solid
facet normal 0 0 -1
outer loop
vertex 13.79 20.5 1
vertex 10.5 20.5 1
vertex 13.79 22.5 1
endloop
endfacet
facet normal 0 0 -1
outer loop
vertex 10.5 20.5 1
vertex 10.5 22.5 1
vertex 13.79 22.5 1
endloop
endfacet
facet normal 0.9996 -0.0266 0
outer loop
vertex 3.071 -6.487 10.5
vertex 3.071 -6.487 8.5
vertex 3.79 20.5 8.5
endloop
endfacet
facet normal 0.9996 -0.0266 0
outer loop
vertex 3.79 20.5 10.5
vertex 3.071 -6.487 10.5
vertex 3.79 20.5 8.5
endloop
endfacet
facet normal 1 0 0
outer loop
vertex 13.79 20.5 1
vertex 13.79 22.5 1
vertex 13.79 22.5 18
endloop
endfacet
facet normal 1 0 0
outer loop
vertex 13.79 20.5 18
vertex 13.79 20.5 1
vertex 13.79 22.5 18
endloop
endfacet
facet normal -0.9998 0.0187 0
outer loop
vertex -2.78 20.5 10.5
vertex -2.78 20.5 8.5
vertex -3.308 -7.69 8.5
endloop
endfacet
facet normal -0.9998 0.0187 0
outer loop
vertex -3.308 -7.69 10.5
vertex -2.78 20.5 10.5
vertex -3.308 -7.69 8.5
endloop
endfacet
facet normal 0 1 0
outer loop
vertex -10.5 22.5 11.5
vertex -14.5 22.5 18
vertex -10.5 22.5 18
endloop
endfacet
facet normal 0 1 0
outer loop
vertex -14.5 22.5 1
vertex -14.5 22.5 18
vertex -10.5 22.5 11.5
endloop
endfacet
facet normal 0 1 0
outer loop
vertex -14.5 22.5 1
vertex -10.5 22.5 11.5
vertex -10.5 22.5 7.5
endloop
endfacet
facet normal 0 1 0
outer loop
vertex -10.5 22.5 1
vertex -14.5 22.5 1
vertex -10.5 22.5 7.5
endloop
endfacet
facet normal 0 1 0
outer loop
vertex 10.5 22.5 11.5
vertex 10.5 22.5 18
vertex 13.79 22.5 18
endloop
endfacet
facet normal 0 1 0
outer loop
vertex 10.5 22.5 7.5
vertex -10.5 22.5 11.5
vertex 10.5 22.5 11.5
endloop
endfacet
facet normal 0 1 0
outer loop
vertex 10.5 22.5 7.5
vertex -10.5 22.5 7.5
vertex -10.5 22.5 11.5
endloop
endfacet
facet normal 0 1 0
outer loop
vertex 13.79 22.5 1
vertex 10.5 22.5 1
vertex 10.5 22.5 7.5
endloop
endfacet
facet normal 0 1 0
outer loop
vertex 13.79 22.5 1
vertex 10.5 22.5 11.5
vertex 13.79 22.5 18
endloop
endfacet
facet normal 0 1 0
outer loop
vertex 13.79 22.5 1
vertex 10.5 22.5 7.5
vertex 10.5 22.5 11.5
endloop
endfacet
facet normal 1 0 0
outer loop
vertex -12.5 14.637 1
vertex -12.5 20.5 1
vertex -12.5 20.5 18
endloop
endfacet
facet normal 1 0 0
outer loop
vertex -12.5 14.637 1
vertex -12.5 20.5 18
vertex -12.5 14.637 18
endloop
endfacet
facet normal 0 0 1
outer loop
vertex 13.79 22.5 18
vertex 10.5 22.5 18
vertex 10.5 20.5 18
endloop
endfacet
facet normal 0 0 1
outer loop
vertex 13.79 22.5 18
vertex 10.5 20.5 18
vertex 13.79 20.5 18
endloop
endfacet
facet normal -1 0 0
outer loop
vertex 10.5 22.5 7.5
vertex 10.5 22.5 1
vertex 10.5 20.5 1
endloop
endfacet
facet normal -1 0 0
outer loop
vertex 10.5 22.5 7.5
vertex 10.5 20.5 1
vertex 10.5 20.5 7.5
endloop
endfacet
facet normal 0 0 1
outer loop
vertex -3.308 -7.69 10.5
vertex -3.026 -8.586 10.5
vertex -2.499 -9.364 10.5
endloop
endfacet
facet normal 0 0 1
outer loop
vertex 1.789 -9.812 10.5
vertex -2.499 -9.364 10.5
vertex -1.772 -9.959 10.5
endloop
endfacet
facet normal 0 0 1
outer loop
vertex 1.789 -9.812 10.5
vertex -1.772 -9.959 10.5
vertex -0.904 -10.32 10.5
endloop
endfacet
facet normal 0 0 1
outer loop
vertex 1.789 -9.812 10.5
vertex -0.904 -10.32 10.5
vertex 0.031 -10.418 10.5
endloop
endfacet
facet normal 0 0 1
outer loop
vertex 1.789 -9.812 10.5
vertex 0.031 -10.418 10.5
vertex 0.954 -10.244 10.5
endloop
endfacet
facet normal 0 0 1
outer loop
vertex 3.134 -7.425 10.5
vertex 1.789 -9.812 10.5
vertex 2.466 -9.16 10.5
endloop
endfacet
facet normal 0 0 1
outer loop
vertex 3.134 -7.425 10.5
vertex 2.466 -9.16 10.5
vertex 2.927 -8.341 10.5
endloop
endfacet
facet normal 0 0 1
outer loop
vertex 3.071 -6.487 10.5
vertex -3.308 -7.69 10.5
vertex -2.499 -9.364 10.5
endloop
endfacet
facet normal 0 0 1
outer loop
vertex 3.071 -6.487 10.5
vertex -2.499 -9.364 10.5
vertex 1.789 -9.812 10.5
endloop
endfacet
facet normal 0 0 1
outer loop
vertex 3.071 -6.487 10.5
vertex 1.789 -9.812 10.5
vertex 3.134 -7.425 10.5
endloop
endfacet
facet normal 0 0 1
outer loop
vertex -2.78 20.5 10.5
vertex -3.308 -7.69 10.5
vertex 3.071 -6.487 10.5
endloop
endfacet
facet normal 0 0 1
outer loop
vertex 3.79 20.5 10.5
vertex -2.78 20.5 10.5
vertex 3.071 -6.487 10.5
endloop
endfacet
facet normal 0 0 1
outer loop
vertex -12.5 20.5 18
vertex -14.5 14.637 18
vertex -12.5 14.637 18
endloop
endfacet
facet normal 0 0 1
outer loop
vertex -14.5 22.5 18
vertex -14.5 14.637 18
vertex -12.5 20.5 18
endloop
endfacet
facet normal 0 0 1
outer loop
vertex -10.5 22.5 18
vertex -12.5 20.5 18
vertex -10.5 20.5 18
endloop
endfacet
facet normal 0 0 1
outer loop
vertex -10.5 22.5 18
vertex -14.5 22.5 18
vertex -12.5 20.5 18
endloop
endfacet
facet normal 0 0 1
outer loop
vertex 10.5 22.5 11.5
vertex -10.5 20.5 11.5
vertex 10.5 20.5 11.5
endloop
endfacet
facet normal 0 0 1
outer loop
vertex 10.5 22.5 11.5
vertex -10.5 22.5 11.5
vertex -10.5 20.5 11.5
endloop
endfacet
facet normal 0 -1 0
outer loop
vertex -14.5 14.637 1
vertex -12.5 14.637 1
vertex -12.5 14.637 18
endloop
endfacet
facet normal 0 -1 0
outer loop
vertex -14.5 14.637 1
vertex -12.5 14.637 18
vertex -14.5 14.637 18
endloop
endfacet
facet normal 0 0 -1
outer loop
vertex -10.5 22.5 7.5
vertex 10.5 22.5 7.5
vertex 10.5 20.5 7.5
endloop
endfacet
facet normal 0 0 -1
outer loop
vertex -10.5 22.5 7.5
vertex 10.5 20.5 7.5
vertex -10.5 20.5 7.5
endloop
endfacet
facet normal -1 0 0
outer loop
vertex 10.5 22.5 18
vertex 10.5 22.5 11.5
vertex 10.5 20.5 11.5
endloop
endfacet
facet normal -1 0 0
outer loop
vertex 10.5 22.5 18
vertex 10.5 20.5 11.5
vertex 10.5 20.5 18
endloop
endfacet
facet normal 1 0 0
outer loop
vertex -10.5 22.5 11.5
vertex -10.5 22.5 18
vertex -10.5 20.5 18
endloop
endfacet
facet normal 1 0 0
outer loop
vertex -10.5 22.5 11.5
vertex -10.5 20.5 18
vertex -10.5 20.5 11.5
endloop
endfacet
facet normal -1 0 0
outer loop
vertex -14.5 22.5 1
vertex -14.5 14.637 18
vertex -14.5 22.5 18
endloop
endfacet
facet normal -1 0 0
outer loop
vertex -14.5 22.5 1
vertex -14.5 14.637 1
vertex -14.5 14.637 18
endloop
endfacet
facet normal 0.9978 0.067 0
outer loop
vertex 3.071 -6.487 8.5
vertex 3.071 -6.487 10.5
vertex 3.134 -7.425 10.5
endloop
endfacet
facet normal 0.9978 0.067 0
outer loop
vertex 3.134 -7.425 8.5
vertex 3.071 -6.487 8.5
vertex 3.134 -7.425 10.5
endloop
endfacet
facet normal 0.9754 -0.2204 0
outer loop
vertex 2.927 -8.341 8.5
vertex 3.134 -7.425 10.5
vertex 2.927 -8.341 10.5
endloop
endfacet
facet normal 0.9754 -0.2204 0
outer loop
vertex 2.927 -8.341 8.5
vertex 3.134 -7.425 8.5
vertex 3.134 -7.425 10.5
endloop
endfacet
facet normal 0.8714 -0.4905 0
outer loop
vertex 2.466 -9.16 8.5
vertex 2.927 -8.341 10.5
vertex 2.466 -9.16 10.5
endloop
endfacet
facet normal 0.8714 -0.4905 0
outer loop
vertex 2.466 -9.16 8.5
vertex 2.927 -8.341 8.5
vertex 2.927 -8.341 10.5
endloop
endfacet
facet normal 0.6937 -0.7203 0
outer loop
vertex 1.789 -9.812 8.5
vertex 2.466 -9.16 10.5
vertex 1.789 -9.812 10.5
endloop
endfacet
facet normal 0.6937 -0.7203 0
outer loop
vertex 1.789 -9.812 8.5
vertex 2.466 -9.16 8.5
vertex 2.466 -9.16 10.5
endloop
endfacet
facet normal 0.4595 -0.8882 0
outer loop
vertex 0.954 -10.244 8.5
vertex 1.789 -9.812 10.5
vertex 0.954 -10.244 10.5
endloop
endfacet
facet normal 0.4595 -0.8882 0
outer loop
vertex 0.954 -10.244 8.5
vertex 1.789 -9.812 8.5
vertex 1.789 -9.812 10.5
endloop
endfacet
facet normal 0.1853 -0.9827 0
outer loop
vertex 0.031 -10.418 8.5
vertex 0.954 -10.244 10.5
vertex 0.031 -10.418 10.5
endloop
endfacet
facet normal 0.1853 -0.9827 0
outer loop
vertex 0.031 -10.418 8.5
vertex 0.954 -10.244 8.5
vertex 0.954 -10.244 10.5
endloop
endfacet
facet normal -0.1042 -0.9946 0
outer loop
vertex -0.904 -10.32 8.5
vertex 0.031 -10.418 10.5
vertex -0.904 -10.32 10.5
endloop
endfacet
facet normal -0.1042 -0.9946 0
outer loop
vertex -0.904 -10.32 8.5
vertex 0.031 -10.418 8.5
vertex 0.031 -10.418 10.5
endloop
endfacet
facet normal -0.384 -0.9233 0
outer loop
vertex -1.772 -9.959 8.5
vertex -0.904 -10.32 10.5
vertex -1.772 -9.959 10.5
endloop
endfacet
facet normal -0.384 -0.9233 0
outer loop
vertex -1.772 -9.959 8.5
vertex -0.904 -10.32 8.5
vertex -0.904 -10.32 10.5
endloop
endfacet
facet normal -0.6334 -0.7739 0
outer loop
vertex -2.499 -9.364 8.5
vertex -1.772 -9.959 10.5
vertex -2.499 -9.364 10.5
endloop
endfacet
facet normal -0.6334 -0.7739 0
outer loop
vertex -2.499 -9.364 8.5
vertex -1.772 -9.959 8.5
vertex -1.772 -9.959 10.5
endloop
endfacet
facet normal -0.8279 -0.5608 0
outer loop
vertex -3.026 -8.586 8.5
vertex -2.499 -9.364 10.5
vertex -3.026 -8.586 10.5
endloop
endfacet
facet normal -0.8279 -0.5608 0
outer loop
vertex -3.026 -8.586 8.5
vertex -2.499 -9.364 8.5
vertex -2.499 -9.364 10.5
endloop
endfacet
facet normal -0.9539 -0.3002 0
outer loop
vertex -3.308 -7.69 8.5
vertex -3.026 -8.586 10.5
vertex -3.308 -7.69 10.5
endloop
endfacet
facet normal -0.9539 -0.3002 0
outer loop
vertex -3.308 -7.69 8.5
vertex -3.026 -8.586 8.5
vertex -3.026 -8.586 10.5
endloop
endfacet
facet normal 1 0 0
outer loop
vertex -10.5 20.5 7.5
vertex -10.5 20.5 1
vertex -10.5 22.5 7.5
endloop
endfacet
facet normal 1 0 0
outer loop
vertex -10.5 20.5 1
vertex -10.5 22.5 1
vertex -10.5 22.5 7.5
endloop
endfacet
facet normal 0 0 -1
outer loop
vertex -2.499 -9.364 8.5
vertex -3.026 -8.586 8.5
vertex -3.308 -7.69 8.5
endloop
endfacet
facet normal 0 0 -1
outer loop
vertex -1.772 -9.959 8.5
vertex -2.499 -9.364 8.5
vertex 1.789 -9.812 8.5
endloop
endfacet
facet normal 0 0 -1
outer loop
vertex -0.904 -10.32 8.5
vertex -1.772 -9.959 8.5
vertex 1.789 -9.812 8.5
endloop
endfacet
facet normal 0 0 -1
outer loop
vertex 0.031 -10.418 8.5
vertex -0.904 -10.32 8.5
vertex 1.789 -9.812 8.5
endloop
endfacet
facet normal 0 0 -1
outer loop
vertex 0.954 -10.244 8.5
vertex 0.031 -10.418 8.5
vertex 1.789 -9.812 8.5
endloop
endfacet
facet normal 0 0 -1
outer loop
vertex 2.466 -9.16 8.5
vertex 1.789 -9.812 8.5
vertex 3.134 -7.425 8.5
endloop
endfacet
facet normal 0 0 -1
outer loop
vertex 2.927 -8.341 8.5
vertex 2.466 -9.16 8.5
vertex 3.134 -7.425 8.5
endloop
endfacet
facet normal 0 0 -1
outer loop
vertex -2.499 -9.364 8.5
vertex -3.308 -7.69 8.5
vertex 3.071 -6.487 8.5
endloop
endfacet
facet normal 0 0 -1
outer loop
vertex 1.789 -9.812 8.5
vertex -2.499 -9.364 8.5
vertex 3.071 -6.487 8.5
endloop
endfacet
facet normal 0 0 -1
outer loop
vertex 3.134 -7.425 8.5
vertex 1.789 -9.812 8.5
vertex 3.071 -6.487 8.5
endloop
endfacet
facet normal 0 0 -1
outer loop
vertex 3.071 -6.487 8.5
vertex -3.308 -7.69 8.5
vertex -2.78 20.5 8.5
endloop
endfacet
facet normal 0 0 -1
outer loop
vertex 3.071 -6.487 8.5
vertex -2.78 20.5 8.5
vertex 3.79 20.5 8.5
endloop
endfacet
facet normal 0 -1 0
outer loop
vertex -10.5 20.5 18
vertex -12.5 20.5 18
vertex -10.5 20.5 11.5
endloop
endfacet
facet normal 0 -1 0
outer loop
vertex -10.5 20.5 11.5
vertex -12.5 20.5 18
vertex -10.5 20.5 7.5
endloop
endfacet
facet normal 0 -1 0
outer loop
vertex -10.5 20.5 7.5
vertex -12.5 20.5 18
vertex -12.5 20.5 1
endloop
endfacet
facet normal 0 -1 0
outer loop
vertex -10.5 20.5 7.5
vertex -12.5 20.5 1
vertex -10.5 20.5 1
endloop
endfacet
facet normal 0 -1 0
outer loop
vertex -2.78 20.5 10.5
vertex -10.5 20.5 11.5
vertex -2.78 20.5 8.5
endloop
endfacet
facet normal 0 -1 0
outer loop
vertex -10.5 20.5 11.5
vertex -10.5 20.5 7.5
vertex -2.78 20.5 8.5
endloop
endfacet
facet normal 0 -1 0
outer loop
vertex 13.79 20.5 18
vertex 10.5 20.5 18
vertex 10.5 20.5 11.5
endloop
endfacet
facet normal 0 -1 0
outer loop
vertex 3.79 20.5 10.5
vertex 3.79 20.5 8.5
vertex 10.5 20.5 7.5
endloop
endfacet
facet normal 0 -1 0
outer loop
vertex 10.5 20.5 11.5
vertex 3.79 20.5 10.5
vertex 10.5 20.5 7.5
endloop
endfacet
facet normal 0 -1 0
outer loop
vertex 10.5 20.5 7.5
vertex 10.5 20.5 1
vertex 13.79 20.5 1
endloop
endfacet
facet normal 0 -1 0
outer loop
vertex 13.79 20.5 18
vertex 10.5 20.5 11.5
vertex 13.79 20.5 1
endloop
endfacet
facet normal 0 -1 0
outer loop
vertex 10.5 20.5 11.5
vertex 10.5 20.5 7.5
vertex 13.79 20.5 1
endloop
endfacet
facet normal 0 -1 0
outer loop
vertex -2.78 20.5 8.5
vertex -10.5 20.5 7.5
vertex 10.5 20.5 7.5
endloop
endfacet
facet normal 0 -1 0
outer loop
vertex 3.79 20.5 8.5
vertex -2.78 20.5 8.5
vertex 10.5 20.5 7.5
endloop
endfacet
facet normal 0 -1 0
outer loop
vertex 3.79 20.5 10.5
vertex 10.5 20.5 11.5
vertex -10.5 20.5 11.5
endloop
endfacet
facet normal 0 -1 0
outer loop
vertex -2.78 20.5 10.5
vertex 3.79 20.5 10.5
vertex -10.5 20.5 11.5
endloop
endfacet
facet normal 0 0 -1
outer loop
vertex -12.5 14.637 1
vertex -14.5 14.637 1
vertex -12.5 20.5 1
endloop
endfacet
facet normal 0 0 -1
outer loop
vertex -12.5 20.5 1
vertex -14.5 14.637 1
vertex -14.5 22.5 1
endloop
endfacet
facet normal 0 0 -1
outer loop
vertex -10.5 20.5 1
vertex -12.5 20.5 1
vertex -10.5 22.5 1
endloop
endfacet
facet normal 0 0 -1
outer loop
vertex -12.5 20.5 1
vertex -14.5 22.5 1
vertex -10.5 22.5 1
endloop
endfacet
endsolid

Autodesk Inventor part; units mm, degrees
ref_plane "YZ Plane" through (0, 0, 0) normal (1, 0, 0) x (0, 1, 0)
ref_plane "Work Plane5" through (0, 0, 9.5) normal (0, 0, 1) x (1, 0, 0)
sketch "Sketch4" plane through (0, 0, 9.5) normal (0, 0, 1) x (1, 0, 0)
  arc A0 (-3.3085, -7.69) -> (3.0707, -6.4871) centre (-0.1029, -7.1736) ccw
  line L0 (3.0707, -6.4871) -> (3.7901, 20.5)
  line L1 (-2.7798, 20.5) -> (-3.3085, -7.69)
  line L2 (-3.8298, 20.5) -> (-2.7798, 20.5)
  line L3 (3.7901, 20.5) -> (4.8401, 20.5)
  line L4 (-11.5, 20.5) -> (-12.5, 20.5) projected
  line L5 (11.5, 20.5) -> (9.5, 20.5) projected
  line L6 (-12.5, 20.5) -> (-2.7798, 20.5)
  line L7 (3.7901, 20.5) -> (18.7901, 20.5)
  line L8 (-12.5, 20.5) -> (-12.5, 14.637)
  line L9 (-12.5, 14.637) -> (-12.5, 20.5)
  line L10 (-12.5, 14.637) -> (-14.5, 14.637)
  line L11 (-14.5, 14.637) -> (-14.5, 22.5)
  line L12 (-14.5, 22.5) -> (18.7901, 22.5)
  line L13 (18.7901, 22.5) -> (18.7901, 20.5)
  line L14 (-2.7798, 20.5) -> (3.7901, 20.5)
  point P0 (0, 0)
  point P1 (-0.3189, -10.4133)
  dimension "d34" = 15
  dimension "d36" = 2
extrude "Extrusion7" add sketch "Sketch4" along normal mid plane 2 contours L1 L14 L0 A0
extrude "Extrusion8" add sketch "Sketch4" along normal mid plane 17 contours L2 L6 L4 L8 L10 L11 L12 L13 L7 L5 L3 L14
ref_plane "Work Plane4" through (-12.5, 22.5, 0) normal (0, 1, 0) x (1, 0, 0)
sketch "Sketch5" plane through (-12.5, 22.5, 0) normal (0, 1, 0) x (1, 0, 0)
  line L0 (-2, -11.5) -> (27, -11.5)
  line L1 (27, -11.5) -> (27, -7.5)
  line L2 (27, -7.5) -> (-2, -7.5)
  line L3 (-2, -7.5) -> (-2, -11.5)
  line L4 (15.5, -9.5) -> (9.5, -9.5) projected
  line L5 (-2, -11.5) -> (27, -7.5) construction
  line L6 (27, -11.5) -> (-2, -7.5) construction
  line L7 (0, -1) -> (25, -1)
  line L8 (25, -1) -> (25, -7.5)
  line L9 (25, -7.5) -> (0, -7.5)
  line L10 (0, -7.5) -> (0, -1)
  line L11 (0, -9.5) -> (0, -18) projected
  line L12 (0, -18) -> (31.2901, -18) projected
  line L13 (0, -11.5) -> (25, -11.5)
  line L14 (25, -11.5) -> (25, -18)
  line L15 (25, -18) -> (0, -18)
  line L16 (0, -18) -> (0, -11.5)
  point P0 (12.5, 0)
  point P1 (12.5, -9.5)
extrude "Extrusion9" cut sketch "Sketch5" against normal through all contours L0 L14 L12 L11 | L10 L7 L8 L2
sketch "Sketch6" plane through (-14.5, 22.5, 1) normal (0, 1, 0) x (1, 0, 0)
  line L0 (2, -6.5) -> (27, -6.5) projected
  line L1 (2, 0) -> (4, 0)
  line L2 (4, 0) -> (4, -6.5)
  line L3 (4, -6.5) -> (2, -6.5)
  line L4 (2, -6.5) -> (2, 0)
  line L5 (27, -10.5) -> (2, -10.5) projected
  line L6 (2, -17) -> (4, -17)
  line L7 (4, -17) -> (4, -10.5)
  line L8 (4, -10.5) -> (2, -10.5)
  line L9 (2, -10.5) -> (2, -17)
  line L10 (27, 0) -> (25, 0)
  line L11 (25, 0) -> (25, -6.5)
  line L12 (25, -6.5) -> (27, -6.5)
  line L13 (27, -6.5) -> (27, 0)
  line L14 (27, -10.5) -> (25, -10.5)
  line L15 (25, -10.5) -> (25, -17)
  line L16 (25, -17) -> (27, -17)
  line L17 (27, -17) -> (27, -10.5)
  point P0 (14.5, 1)
  dimension "d43" = 2
  dimension "d44" = 2
  dimension "d45" = 2
  dimension "d46" = 2
extrude "Extrusion10" add sketch "Sketch6" against normal blind 2
sketch "Sketch7" plane through (18.7901, 22.5, 18) normal (0, 1, 0) x (1, 0, 0)
  line L0 (-8.2901, 0) -> (0, 0) projected
  line L1 (0, 17) -> (-5, 17)
  line L2 (-5, 17) -> (-5, 0)
  line L3 (-5, 0) -> (0, 0)
  line L4 (0, 0) -> (0, 17)
  point P0 (-18.7901, 18)
  dimension "d49" = 5
extrude "Extrusion11" cut sketch "Sketch7" against normal through all
properties part number "cover sepatu"
